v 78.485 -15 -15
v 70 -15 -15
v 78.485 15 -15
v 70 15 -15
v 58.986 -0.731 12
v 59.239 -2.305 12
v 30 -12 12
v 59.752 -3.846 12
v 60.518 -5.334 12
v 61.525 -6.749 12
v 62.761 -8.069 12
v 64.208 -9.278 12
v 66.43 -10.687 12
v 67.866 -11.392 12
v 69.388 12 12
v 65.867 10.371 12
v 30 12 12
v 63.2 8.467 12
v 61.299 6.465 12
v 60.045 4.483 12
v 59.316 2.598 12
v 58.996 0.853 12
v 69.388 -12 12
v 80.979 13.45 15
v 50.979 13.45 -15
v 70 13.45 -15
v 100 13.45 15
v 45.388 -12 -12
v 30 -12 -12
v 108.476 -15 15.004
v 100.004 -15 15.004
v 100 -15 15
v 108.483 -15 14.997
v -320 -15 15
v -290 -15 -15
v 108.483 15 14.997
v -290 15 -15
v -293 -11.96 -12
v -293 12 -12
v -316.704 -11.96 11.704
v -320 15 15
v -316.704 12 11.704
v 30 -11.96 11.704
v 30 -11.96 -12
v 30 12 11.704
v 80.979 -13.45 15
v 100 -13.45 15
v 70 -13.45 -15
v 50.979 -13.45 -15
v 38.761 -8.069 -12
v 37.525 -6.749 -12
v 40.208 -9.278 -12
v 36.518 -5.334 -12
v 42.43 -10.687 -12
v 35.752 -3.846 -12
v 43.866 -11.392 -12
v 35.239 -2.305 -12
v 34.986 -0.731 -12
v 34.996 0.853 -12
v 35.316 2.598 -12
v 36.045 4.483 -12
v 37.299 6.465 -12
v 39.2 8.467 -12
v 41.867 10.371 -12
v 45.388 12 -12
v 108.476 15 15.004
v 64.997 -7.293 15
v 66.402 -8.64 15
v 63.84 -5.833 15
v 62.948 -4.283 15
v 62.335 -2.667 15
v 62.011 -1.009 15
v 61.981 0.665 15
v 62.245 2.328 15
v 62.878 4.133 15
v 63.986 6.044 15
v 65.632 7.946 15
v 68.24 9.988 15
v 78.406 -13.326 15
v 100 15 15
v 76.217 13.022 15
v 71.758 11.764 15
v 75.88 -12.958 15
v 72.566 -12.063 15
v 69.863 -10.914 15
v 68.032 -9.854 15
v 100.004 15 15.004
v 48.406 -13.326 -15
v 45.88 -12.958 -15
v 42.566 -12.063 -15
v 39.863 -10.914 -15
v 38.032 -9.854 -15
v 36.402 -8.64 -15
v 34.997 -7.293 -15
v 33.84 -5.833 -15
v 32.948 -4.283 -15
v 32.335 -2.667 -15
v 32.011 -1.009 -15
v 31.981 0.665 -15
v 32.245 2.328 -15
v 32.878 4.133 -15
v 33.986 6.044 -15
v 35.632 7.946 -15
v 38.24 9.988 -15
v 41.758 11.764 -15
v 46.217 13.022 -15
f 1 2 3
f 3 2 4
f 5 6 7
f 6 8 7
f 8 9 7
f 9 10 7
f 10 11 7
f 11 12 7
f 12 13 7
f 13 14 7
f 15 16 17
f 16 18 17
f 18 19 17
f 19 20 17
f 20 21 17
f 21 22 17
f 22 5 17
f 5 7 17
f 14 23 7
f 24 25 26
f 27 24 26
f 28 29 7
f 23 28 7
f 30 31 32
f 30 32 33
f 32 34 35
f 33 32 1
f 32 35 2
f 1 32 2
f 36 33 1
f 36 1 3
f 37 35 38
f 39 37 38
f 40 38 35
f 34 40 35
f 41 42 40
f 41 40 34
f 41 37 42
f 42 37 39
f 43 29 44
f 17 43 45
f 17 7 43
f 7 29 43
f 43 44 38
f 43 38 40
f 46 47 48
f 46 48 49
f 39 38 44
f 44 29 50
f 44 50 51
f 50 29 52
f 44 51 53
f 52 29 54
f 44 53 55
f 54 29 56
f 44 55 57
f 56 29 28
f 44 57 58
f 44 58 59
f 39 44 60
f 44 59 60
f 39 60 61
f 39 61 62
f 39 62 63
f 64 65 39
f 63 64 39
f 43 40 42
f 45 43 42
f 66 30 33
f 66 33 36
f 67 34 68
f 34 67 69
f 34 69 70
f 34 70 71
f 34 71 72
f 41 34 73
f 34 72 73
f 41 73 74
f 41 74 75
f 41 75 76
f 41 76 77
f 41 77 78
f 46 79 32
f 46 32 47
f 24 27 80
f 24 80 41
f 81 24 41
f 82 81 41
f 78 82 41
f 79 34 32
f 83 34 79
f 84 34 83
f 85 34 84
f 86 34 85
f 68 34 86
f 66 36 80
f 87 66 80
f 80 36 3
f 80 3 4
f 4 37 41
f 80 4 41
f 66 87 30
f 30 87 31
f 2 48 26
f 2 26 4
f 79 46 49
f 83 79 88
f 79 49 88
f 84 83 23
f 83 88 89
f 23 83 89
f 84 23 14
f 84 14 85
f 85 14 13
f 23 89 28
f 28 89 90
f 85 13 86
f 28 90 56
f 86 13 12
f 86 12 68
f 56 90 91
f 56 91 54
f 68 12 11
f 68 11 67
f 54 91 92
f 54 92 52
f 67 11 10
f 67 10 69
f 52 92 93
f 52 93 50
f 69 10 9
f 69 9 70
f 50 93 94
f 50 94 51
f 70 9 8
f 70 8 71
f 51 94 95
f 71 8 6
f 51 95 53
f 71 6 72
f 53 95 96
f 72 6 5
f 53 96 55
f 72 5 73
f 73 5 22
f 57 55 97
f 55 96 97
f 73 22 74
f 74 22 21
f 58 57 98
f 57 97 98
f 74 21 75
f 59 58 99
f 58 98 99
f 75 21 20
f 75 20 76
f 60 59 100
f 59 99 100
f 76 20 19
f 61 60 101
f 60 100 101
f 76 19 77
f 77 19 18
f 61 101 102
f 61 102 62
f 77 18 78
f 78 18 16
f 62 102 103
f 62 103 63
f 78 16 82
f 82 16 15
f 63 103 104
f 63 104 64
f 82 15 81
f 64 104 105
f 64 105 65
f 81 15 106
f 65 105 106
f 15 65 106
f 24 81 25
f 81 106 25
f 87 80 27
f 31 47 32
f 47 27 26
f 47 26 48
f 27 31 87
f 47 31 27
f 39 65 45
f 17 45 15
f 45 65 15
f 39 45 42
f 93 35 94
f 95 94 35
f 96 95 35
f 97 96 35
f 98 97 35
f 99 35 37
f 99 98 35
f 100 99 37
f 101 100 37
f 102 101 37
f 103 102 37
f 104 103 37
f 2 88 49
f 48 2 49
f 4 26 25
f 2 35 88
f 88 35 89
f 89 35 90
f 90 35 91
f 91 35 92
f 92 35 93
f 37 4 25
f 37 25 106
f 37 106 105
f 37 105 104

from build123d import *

# Parameters (mm, degrees)
F0_W         = 30
F0_H         = 30
F0_W_2       = 24
F0_H_2       = 24
F1_DEPTH     = 100
F3_DEPTH     = 30
F5_DEPTH     = 30
F7_DEPTH     = 6
F9_DEPTH     = 50
F13_W        = 30
F13_H        = 30
F14_DEPTH    = 30
F12_W        = 30
F12_H        = 30
F12_W_2      = 23.9601944461
F12_H_2      = 23.7035881728
F15_DEPTH    = 350
F16_T1_DEPTH = 184.300979278
F18_DEPTH    = 44.18
F19_SIZE     = 5.99
F20_SIZE     = 5.99999


# Not quite as in the source:
# - a fillet or chamfer that OpenCascade refuses, or shapes differently, is made with other operations: its cross-section is extruded or revolved along the edge and cut away or added
# - a fillet or chamfer is up to 0.001 mm smaller than in the source, because OpenCascade refuses the exact size


with BuildPart() as f1:
    # F0 (on Right) → F1 (new body)
    with BuildSketch(Plane.YZ):
        Rectangle(F0_W, F0_H)
        Rectangle(F0_W_2, F0_H_2, mode=Mode.SUBTRACT)
    extrude(amount=F1_DEPTH)

    # F2 (on face) → F3 (cut)
    with BuildSketch(Plane(origin=(0, 15, 0), x_dir=(-1, 0, 0), z_dir=(0, 1, 0))):
        Polygon((0, 15), (-30, -15), (0, -15), align=None)
    extrude(amount=-F3_DEPTH, mode=Mode.SUBTRACT)

    # F4 (on face) → F5 (cut)
    with BuildSketch(Plane.XZ.offset(15)):
        Polygon((70, -15), (100, -15), (100, 15), align=None)
    extrude(amount=-F5_DEPTH, mode=Mode.SUBTRACT)

    # F6 (on face) → F7 (join)
    with BuildSketch(Plane(origin=(42.5, 0, -42.5), x_dir=(0, 1, 0), z_dir=(0.7071067812, 0, -0.7071067812))):
        Polygon((-15, 38.8908729653), (15, 38.8908729653), (15, 43.1335136524), (12, 43.1335136524), (-12, 43.1335136524), (-15, 43.1335136524), align=None)
    extrude(amount=F7_DEPTH)

    # F8 (on face) → F9 (cut, symmetric)
    with BuildSketch(Plane(origin=(27.5, 0, 27.5), x_dir=(0, -1, 0), z_dir=(-0.7071067812, 0, -0.7071067812))):
        with BuildLine():
            ThreePointArc((9.63e-08, -60.1040764009), (9.510586241, -56.1646625738), (13.45, -46.6540764009))
            ThreePointArc((13.45, -46.6540764009), (0, -33.2040764009), (-13.45, -46.6540764009))
            ThreePointArc((-13.45, -46.6540764009), (-9.5105861729, -56.1646626419), (9.63e-08, -60.1040764009))
        make_face()
        with BuildLine():
            Line((13.45, -60.1040764009), (13.45, -46.6540764009))
            ThreePointArc((13.45, -46.6540764009), (9.510586241, -56.1646625738), (9.63e-08, -60.1040764009))
            Line((9.63e-08, -60.1040764009), (13.45, -60.1040764009))
        make_face()
        with BuildLine():
            ThreePointArc((9.63e-08, -60.1040764009), (-9.5105861729, -56.1646626419), (-13.45, -46.6540764009))
            Line((-13.45, -46.6540764009), (-13.45, -60.1040764009))
            Line((-13.45, -60.1040764009), (9.63e-08, -60.1040764009))
        make_face()
    extrude(amount=F9_DEPTH, both=True, mode=Mode.SUBTRACT)

    # F13 (on face) → F14 (cut)
    with BuildSketch(Plane(origin=(0, 15, 0), x_dir=(-1, 0, 0), z_dir=(0, 1, 0))):
        with Locations((-15, 0)):
            Rectangle(F13_W, F13_H)
    extrude(amount=-F14_DEPTH, mode=Mode.SUBTRACT)

    # F12 (on face) → F15 (join)
    with BuildSketch(Plane.YZ.offset(30)):
        Rectangle(F12_W, F12_H)
        with Locations((0.0199027769, -0.1482059136)):
            Rectangle(F12_W_2, F12_H_2, mode=Mode.SUBTRACT)
    extrude(amount=-F15_DEPTH)

    # F16: chamfer of 30 on 1 edges, made by hand

    # F16_s2 → F16_t1 (cut)
    with BuildSketch(Plane.XZ.offset(-92.150489639)):
        Polygon((-290, -15), (-320, 15), (-320, -15), align=None)
    extrude(amount=F16_T1_DEPTH, mode=Mode.SUBTRACT)

    # F17 (on face) → F18 (join)
    with BuildSketch(Plane(origin=(30.5, 0, 30.5), x_dir=(0, 1, 0), z_dir=(0.7071067812, 0, 0.7071067812))):
        Polygon((-13.45, -60.1040764009), (-15, -60.1040764009), (-15, -66.1040764009), (15, -66.1040764009), (15, -60.1040764009), (13.45, -60.1040764009), align=None)
    extrude(amount=F18_DEPTH)

    # F19
    f19_edges = [f1.edges().sort_by_distance(p)[0] for p in [
        (104.239978, 0, 19.239978),
    ]]
    chamfer(f19_edges, length=F19_SIZE)

    # F20 (size 6 in the source; OpenCascade refuses exactly that, so slightly less here)
    f20_edges = [f1.edges().sort_by_distance(p)[0] for p in [
        (74.242641, 0, -19.242641),
    ]]
    chamfer(f20_edges, length=F20_SIZE)


solid = f1.part
